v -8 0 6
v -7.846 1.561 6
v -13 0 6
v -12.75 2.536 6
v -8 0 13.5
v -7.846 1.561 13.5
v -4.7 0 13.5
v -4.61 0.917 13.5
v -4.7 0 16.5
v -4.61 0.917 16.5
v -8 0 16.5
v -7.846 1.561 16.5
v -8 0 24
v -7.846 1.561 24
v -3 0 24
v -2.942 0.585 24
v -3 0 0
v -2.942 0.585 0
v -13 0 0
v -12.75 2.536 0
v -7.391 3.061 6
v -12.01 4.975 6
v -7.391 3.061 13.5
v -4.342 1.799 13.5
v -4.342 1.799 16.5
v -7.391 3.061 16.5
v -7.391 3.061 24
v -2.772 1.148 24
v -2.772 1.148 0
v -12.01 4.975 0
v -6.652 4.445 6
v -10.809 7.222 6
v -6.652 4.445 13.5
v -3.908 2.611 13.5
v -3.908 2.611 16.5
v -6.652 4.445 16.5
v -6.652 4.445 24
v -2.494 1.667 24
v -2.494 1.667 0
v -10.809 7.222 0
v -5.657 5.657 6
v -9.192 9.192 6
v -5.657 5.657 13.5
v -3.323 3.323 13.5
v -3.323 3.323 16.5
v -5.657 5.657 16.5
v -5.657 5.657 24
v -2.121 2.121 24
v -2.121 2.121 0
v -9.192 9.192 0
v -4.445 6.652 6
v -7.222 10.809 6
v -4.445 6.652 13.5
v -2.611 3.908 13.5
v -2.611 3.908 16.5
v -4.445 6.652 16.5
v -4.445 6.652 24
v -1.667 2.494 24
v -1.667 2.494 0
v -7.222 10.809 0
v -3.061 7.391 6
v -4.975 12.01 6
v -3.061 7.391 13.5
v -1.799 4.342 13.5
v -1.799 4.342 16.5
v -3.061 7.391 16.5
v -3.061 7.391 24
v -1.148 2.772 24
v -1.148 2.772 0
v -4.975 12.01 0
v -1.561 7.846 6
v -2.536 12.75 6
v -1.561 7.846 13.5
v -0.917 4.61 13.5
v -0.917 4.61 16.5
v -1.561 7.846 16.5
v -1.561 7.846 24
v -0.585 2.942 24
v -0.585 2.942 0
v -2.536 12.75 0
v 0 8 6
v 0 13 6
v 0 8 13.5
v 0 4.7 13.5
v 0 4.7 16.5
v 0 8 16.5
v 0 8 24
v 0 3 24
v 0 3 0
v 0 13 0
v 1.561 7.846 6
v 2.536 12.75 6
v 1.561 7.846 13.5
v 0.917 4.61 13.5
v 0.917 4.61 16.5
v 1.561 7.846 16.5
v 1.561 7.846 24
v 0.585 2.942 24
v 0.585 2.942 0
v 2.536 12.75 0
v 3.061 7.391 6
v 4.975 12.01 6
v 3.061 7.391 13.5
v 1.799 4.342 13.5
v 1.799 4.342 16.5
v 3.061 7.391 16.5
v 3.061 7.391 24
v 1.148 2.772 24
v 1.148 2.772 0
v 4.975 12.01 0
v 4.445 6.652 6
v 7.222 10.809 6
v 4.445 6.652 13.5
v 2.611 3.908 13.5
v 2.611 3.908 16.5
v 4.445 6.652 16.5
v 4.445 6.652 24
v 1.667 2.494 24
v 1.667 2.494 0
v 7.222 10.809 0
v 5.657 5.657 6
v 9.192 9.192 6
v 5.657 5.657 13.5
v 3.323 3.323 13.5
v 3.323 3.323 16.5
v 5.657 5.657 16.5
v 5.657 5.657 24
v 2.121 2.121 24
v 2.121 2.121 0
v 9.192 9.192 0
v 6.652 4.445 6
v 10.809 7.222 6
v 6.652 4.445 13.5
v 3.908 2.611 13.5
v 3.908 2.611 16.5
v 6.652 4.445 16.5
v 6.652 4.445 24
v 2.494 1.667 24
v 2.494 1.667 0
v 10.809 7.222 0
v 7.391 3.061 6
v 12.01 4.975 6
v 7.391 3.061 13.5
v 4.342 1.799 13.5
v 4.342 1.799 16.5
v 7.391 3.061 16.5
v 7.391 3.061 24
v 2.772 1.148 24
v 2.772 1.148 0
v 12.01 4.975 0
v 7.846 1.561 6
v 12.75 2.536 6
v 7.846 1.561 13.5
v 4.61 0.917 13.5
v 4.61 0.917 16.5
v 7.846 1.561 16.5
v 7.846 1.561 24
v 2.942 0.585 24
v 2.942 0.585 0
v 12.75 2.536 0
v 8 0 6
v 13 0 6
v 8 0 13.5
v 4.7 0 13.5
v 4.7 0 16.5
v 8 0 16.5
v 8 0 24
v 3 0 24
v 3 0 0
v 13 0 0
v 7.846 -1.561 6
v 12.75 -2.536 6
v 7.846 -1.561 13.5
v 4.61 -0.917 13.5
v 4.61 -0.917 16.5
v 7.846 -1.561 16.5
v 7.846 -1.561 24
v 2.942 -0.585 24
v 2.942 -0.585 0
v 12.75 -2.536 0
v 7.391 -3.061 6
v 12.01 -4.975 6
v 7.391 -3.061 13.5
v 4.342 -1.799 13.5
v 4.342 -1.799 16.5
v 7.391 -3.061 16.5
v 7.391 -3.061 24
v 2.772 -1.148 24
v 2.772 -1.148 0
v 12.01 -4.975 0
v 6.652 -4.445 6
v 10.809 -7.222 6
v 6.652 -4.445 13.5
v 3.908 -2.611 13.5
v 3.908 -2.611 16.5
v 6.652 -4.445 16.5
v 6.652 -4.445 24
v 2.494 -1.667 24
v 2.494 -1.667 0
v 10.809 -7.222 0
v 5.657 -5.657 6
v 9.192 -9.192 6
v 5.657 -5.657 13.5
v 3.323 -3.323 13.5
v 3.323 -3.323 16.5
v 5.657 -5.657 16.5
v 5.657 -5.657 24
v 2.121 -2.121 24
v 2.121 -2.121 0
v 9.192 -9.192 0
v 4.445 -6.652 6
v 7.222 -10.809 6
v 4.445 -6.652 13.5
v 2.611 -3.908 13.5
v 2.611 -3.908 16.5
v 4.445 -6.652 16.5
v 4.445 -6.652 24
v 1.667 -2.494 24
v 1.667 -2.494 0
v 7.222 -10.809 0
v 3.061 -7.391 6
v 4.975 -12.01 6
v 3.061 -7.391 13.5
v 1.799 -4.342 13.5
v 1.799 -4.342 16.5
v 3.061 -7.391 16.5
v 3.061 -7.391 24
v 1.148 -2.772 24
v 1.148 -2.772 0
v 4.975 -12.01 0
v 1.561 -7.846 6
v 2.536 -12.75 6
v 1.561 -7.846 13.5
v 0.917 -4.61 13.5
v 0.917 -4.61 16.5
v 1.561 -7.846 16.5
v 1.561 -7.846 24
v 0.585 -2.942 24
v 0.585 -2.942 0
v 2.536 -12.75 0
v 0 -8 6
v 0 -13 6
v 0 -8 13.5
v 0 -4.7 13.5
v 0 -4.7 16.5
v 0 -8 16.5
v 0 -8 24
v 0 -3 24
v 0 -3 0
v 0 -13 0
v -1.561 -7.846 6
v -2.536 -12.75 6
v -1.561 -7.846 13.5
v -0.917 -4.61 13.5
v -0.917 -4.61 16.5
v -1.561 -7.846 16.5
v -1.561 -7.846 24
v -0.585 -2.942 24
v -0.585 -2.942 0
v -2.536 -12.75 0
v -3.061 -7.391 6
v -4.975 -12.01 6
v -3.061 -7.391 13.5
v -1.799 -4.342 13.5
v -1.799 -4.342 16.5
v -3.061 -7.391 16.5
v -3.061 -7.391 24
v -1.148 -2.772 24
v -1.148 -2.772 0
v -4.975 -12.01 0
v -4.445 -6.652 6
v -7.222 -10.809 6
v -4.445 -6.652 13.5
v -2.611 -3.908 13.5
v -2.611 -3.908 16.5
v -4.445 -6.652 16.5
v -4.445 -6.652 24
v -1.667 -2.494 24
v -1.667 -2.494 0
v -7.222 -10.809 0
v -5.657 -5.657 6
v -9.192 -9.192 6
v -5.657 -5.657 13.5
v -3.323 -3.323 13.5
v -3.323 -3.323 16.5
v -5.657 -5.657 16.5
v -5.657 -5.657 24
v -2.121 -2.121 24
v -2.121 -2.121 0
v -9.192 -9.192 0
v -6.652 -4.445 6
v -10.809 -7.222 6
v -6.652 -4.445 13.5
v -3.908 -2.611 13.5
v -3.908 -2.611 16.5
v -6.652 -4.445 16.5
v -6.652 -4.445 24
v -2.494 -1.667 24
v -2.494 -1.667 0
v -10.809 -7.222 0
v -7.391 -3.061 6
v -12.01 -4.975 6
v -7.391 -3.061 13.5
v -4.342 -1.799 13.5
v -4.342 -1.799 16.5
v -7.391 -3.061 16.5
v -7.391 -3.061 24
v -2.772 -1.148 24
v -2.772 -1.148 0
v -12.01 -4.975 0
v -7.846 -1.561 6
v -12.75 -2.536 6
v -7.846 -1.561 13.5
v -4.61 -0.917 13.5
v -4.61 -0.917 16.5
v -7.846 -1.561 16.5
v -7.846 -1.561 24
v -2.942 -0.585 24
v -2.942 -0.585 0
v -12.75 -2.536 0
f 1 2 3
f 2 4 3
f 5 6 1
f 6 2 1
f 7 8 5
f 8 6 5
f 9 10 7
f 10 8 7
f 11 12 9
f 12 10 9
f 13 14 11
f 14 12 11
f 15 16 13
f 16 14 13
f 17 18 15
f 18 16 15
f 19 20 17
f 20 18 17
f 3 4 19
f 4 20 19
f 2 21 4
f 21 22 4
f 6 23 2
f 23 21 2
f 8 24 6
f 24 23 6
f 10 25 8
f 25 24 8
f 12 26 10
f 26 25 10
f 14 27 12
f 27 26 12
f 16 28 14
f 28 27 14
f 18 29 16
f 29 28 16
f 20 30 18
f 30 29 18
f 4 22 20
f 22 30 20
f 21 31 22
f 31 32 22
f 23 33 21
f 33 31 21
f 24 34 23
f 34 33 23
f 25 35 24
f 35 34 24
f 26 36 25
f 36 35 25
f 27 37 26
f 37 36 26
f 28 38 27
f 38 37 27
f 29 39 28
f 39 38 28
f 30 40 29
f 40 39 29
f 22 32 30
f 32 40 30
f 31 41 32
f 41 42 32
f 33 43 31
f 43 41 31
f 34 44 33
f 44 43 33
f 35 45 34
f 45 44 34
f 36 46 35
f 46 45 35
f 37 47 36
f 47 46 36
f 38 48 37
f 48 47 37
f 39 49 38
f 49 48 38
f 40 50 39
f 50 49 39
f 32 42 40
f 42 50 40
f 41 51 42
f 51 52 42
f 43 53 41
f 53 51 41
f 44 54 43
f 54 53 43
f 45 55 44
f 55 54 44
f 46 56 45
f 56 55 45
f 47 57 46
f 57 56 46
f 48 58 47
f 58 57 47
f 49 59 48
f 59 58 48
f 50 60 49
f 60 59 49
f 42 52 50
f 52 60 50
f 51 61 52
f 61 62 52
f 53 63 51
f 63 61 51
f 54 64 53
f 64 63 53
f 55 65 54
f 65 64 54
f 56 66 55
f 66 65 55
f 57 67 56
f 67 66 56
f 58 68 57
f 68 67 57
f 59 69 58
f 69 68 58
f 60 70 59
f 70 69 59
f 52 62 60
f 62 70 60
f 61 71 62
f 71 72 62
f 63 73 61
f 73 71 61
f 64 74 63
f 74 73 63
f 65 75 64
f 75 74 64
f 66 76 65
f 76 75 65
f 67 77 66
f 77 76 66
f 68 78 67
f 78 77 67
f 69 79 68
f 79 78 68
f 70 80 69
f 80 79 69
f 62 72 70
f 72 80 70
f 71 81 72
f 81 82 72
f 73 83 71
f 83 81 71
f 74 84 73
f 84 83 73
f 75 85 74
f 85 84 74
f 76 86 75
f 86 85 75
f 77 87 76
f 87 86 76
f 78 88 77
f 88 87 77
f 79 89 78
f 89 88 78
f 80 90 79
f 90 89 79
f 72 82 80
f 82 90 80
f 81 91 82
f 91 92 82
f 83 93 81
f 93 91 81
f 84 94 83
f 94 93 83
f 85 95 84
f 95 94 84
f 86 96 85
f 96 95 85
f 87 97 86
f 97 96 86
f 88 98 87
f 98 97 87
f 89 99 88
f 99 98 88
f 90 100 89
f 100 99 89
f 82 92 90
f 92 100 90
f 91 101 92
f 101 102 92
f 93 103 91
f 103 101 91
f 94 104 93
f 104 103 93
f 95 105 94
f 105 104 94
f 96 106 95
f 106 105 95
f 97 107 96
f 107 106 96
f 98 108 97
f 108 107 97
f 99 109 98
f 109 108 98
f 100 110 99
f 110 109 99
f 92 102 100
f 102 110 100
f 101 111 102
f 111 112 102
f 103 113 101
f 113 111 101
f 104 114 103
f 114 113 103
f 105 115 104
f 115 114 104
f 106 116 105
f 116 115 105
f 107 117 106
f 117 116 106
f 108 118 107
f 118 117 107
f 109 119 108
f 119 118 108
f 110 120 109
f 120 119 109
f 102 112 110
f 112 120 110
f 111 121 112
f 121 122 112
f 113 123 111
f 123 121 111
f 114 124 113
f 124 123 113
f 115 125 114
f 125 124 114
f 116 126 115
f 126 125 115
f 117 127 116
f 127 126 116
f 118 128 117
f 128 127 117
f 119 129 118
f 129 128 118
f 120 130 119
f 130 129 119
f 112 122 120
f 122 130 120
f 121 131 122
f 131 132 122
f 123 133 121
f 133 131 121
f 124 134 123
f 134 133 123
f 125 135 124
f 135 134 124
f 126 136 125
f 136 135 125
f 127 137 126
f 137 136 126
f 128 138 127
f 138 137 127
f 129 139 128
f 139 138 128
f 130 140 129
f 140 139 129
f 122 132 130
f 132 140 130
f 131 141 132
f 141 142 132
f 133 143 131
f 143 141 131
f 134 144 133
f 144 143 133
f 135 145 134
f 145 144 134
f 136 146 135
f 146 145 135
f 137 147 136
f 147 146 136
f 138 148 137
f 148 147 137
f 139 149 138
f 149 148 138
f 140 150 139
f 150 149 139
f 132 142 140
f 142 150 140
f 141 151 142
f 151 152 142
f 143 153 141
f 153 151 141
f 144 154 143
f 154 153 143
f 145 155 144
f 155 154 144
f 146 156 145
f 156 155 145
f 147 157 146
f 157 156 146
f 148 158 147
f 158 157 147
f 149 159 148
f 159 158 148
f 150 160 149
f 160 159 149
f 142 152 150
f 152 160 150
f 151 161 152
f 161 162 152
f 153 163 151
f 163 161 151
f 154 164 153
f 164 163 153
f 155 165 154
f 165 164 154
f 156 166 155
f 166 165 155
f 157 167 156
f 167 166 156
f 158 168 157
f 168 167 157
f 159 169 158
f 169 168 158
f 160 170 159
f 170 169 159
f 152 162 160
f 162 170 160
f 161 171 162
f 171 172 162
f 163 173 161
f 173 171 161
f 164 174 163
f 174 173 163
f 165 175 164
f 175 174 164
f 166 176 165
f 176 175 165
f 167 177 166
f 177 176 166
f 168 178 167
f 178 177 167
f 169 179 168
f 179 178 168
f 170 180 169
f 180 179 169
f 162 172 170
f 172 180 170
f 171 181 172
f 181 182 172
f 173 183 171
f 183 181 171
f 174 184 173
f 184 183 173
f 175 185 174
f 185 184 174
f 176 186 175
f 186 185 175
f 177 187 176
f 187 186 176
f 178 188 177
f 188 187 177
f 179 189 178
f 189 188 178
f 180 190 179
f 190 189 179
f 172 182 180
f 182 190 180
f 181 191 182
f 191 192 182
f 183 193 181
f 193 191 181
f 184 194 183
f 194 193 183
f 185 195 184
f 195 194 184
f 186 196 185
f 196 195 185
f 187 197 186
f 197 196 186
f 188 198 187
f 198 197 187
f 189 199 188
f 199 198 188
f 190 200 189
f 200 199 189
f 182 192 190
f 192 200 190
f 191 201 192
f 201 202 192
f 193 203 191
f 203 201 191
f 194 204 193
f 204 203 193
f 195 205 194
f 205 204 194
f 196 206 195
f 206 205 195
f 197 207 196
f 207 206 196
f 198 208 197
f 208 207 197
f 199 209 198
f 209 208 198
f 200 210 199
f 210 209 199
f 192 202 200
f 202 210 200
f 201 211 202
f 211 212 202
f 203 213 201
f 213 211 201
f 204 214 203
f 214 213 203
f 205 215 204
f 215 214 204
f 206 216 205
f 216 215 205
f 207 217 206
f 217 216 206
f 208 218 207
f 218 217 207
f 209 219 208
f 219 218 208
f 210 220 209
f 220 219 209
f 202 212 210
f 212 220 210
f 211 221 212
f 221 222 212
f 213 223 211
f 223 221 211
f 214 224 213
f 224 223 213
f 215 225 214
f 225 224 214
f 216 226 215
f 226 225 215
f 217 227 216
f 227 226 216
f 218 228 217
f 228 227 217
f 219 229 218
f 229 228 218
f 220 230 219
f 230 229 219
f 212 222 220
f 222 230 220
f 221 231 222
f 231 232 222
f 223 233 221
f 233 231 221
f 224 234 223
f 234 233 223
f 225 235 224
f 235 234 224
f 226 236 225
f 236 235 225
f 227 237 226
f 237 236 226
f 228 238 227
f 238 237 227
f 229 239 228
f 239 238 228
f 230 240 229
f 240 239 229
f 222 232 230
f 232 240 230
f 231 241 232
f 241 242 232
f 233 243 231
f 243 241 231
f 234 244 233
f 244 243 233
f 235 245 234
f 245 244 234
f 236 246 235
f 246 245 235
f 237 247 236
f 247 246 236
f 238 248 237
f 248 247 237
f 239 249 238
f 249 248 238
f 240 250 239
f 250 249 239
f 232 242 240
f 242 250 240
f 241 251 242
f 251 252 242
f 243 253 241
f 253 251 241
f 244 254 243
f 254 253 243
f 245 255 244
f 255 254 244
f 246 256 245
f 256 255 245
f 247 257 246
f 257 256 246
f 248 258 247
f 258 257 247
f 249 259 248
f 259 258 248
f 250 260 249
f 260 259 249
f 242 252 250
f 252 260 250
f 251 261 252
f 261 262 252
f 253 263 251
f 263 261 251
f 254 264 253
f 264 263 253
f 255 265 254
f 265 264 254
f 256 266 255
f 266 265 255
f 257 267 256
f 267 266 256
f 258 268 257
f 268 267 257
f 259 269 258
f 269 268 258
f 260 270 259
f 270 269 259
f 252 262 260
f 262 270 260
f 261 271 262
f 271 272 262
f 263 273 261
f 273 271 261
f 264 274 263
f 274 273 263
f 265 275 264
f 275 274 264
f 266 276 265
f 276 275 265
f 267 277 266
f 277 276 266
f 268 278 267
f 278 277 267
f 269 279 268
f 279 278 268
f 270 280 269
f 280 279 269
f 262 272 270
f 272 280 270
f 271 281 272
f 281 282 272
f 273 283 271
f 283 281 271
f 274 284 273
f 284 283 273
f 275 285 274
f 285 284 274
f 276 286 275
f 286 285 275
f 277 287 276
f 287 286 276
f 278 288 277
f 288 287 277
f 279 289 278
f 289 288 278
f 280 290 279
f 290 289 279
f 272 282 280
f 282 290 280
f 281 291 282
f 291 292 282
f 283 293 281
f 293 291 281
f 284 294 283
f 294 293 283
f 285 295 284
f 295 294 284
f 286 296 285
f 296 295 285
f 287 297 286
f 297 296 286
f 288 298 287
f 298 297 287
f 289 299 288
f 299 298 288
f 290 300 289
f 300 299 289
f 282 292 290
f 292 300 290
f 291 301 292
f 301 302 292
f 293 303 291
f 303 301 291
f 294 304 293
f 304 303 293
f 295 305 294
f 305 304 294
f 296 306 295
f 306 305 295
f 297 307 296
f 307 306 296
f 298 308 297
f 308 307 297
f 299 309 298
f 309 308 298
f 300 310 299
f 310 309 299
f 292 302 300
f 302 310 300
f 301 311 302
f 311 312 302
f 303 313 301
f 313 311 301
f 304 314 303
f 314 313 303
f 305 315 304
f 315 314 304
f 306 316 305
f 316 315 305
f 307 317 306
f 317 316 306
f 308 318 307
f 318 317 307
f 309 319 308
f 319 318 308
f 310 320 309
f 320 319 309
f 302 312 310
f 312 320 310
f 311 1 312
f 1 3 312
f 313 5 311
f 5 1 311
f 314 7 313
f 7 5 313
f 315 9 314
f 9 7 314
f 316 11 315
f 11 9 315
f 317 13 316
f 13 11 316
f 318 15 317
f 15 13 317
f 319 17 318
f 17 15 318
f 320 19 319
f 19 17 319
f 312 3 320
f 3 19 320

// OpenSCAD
$fn = 32;

// ----------------------------------------------------------------------
// Grooved revolve: flanged, bore R3
// ----------------------------------------------------------------------

// --- parameters (mm) ---
bore_r = 3;               // bore radius
outer_r = 8;              // outer radius of the body
total_h = 24;             // overall height, Z
wall = 5;                 // radial wall thickness
groove_w = 3;             // groove width
groove_d = 3.3;           // groove depth
grooves = 1;              // number of outer grooves
flange_r = 13;            // flange radius
flange_h = 6;             // flange height

bbox_x = 2 * flange_r;  // full diameter
bore_d = 2 * bore_r;  // bore diameter
body_d = 2 * outer_r;  // body diameter
flange_d = 2 * flange_r;  // flange diameter
revolve_angle = 360;  // full turn around the Z axis

profile = [[3, 0], [8, 0], [13, 0], [13, 6], [8, 6], [8, 13.5], [4.7, 13.5], [4.7, 16.5], [8, 16.5], [8, 24], [3, 24]];  // primary outline, 11 points, counter clockwise

// --- the one profile operation ---
rotate_extrude(angle = revolve_angle) polygon(points = profile);
